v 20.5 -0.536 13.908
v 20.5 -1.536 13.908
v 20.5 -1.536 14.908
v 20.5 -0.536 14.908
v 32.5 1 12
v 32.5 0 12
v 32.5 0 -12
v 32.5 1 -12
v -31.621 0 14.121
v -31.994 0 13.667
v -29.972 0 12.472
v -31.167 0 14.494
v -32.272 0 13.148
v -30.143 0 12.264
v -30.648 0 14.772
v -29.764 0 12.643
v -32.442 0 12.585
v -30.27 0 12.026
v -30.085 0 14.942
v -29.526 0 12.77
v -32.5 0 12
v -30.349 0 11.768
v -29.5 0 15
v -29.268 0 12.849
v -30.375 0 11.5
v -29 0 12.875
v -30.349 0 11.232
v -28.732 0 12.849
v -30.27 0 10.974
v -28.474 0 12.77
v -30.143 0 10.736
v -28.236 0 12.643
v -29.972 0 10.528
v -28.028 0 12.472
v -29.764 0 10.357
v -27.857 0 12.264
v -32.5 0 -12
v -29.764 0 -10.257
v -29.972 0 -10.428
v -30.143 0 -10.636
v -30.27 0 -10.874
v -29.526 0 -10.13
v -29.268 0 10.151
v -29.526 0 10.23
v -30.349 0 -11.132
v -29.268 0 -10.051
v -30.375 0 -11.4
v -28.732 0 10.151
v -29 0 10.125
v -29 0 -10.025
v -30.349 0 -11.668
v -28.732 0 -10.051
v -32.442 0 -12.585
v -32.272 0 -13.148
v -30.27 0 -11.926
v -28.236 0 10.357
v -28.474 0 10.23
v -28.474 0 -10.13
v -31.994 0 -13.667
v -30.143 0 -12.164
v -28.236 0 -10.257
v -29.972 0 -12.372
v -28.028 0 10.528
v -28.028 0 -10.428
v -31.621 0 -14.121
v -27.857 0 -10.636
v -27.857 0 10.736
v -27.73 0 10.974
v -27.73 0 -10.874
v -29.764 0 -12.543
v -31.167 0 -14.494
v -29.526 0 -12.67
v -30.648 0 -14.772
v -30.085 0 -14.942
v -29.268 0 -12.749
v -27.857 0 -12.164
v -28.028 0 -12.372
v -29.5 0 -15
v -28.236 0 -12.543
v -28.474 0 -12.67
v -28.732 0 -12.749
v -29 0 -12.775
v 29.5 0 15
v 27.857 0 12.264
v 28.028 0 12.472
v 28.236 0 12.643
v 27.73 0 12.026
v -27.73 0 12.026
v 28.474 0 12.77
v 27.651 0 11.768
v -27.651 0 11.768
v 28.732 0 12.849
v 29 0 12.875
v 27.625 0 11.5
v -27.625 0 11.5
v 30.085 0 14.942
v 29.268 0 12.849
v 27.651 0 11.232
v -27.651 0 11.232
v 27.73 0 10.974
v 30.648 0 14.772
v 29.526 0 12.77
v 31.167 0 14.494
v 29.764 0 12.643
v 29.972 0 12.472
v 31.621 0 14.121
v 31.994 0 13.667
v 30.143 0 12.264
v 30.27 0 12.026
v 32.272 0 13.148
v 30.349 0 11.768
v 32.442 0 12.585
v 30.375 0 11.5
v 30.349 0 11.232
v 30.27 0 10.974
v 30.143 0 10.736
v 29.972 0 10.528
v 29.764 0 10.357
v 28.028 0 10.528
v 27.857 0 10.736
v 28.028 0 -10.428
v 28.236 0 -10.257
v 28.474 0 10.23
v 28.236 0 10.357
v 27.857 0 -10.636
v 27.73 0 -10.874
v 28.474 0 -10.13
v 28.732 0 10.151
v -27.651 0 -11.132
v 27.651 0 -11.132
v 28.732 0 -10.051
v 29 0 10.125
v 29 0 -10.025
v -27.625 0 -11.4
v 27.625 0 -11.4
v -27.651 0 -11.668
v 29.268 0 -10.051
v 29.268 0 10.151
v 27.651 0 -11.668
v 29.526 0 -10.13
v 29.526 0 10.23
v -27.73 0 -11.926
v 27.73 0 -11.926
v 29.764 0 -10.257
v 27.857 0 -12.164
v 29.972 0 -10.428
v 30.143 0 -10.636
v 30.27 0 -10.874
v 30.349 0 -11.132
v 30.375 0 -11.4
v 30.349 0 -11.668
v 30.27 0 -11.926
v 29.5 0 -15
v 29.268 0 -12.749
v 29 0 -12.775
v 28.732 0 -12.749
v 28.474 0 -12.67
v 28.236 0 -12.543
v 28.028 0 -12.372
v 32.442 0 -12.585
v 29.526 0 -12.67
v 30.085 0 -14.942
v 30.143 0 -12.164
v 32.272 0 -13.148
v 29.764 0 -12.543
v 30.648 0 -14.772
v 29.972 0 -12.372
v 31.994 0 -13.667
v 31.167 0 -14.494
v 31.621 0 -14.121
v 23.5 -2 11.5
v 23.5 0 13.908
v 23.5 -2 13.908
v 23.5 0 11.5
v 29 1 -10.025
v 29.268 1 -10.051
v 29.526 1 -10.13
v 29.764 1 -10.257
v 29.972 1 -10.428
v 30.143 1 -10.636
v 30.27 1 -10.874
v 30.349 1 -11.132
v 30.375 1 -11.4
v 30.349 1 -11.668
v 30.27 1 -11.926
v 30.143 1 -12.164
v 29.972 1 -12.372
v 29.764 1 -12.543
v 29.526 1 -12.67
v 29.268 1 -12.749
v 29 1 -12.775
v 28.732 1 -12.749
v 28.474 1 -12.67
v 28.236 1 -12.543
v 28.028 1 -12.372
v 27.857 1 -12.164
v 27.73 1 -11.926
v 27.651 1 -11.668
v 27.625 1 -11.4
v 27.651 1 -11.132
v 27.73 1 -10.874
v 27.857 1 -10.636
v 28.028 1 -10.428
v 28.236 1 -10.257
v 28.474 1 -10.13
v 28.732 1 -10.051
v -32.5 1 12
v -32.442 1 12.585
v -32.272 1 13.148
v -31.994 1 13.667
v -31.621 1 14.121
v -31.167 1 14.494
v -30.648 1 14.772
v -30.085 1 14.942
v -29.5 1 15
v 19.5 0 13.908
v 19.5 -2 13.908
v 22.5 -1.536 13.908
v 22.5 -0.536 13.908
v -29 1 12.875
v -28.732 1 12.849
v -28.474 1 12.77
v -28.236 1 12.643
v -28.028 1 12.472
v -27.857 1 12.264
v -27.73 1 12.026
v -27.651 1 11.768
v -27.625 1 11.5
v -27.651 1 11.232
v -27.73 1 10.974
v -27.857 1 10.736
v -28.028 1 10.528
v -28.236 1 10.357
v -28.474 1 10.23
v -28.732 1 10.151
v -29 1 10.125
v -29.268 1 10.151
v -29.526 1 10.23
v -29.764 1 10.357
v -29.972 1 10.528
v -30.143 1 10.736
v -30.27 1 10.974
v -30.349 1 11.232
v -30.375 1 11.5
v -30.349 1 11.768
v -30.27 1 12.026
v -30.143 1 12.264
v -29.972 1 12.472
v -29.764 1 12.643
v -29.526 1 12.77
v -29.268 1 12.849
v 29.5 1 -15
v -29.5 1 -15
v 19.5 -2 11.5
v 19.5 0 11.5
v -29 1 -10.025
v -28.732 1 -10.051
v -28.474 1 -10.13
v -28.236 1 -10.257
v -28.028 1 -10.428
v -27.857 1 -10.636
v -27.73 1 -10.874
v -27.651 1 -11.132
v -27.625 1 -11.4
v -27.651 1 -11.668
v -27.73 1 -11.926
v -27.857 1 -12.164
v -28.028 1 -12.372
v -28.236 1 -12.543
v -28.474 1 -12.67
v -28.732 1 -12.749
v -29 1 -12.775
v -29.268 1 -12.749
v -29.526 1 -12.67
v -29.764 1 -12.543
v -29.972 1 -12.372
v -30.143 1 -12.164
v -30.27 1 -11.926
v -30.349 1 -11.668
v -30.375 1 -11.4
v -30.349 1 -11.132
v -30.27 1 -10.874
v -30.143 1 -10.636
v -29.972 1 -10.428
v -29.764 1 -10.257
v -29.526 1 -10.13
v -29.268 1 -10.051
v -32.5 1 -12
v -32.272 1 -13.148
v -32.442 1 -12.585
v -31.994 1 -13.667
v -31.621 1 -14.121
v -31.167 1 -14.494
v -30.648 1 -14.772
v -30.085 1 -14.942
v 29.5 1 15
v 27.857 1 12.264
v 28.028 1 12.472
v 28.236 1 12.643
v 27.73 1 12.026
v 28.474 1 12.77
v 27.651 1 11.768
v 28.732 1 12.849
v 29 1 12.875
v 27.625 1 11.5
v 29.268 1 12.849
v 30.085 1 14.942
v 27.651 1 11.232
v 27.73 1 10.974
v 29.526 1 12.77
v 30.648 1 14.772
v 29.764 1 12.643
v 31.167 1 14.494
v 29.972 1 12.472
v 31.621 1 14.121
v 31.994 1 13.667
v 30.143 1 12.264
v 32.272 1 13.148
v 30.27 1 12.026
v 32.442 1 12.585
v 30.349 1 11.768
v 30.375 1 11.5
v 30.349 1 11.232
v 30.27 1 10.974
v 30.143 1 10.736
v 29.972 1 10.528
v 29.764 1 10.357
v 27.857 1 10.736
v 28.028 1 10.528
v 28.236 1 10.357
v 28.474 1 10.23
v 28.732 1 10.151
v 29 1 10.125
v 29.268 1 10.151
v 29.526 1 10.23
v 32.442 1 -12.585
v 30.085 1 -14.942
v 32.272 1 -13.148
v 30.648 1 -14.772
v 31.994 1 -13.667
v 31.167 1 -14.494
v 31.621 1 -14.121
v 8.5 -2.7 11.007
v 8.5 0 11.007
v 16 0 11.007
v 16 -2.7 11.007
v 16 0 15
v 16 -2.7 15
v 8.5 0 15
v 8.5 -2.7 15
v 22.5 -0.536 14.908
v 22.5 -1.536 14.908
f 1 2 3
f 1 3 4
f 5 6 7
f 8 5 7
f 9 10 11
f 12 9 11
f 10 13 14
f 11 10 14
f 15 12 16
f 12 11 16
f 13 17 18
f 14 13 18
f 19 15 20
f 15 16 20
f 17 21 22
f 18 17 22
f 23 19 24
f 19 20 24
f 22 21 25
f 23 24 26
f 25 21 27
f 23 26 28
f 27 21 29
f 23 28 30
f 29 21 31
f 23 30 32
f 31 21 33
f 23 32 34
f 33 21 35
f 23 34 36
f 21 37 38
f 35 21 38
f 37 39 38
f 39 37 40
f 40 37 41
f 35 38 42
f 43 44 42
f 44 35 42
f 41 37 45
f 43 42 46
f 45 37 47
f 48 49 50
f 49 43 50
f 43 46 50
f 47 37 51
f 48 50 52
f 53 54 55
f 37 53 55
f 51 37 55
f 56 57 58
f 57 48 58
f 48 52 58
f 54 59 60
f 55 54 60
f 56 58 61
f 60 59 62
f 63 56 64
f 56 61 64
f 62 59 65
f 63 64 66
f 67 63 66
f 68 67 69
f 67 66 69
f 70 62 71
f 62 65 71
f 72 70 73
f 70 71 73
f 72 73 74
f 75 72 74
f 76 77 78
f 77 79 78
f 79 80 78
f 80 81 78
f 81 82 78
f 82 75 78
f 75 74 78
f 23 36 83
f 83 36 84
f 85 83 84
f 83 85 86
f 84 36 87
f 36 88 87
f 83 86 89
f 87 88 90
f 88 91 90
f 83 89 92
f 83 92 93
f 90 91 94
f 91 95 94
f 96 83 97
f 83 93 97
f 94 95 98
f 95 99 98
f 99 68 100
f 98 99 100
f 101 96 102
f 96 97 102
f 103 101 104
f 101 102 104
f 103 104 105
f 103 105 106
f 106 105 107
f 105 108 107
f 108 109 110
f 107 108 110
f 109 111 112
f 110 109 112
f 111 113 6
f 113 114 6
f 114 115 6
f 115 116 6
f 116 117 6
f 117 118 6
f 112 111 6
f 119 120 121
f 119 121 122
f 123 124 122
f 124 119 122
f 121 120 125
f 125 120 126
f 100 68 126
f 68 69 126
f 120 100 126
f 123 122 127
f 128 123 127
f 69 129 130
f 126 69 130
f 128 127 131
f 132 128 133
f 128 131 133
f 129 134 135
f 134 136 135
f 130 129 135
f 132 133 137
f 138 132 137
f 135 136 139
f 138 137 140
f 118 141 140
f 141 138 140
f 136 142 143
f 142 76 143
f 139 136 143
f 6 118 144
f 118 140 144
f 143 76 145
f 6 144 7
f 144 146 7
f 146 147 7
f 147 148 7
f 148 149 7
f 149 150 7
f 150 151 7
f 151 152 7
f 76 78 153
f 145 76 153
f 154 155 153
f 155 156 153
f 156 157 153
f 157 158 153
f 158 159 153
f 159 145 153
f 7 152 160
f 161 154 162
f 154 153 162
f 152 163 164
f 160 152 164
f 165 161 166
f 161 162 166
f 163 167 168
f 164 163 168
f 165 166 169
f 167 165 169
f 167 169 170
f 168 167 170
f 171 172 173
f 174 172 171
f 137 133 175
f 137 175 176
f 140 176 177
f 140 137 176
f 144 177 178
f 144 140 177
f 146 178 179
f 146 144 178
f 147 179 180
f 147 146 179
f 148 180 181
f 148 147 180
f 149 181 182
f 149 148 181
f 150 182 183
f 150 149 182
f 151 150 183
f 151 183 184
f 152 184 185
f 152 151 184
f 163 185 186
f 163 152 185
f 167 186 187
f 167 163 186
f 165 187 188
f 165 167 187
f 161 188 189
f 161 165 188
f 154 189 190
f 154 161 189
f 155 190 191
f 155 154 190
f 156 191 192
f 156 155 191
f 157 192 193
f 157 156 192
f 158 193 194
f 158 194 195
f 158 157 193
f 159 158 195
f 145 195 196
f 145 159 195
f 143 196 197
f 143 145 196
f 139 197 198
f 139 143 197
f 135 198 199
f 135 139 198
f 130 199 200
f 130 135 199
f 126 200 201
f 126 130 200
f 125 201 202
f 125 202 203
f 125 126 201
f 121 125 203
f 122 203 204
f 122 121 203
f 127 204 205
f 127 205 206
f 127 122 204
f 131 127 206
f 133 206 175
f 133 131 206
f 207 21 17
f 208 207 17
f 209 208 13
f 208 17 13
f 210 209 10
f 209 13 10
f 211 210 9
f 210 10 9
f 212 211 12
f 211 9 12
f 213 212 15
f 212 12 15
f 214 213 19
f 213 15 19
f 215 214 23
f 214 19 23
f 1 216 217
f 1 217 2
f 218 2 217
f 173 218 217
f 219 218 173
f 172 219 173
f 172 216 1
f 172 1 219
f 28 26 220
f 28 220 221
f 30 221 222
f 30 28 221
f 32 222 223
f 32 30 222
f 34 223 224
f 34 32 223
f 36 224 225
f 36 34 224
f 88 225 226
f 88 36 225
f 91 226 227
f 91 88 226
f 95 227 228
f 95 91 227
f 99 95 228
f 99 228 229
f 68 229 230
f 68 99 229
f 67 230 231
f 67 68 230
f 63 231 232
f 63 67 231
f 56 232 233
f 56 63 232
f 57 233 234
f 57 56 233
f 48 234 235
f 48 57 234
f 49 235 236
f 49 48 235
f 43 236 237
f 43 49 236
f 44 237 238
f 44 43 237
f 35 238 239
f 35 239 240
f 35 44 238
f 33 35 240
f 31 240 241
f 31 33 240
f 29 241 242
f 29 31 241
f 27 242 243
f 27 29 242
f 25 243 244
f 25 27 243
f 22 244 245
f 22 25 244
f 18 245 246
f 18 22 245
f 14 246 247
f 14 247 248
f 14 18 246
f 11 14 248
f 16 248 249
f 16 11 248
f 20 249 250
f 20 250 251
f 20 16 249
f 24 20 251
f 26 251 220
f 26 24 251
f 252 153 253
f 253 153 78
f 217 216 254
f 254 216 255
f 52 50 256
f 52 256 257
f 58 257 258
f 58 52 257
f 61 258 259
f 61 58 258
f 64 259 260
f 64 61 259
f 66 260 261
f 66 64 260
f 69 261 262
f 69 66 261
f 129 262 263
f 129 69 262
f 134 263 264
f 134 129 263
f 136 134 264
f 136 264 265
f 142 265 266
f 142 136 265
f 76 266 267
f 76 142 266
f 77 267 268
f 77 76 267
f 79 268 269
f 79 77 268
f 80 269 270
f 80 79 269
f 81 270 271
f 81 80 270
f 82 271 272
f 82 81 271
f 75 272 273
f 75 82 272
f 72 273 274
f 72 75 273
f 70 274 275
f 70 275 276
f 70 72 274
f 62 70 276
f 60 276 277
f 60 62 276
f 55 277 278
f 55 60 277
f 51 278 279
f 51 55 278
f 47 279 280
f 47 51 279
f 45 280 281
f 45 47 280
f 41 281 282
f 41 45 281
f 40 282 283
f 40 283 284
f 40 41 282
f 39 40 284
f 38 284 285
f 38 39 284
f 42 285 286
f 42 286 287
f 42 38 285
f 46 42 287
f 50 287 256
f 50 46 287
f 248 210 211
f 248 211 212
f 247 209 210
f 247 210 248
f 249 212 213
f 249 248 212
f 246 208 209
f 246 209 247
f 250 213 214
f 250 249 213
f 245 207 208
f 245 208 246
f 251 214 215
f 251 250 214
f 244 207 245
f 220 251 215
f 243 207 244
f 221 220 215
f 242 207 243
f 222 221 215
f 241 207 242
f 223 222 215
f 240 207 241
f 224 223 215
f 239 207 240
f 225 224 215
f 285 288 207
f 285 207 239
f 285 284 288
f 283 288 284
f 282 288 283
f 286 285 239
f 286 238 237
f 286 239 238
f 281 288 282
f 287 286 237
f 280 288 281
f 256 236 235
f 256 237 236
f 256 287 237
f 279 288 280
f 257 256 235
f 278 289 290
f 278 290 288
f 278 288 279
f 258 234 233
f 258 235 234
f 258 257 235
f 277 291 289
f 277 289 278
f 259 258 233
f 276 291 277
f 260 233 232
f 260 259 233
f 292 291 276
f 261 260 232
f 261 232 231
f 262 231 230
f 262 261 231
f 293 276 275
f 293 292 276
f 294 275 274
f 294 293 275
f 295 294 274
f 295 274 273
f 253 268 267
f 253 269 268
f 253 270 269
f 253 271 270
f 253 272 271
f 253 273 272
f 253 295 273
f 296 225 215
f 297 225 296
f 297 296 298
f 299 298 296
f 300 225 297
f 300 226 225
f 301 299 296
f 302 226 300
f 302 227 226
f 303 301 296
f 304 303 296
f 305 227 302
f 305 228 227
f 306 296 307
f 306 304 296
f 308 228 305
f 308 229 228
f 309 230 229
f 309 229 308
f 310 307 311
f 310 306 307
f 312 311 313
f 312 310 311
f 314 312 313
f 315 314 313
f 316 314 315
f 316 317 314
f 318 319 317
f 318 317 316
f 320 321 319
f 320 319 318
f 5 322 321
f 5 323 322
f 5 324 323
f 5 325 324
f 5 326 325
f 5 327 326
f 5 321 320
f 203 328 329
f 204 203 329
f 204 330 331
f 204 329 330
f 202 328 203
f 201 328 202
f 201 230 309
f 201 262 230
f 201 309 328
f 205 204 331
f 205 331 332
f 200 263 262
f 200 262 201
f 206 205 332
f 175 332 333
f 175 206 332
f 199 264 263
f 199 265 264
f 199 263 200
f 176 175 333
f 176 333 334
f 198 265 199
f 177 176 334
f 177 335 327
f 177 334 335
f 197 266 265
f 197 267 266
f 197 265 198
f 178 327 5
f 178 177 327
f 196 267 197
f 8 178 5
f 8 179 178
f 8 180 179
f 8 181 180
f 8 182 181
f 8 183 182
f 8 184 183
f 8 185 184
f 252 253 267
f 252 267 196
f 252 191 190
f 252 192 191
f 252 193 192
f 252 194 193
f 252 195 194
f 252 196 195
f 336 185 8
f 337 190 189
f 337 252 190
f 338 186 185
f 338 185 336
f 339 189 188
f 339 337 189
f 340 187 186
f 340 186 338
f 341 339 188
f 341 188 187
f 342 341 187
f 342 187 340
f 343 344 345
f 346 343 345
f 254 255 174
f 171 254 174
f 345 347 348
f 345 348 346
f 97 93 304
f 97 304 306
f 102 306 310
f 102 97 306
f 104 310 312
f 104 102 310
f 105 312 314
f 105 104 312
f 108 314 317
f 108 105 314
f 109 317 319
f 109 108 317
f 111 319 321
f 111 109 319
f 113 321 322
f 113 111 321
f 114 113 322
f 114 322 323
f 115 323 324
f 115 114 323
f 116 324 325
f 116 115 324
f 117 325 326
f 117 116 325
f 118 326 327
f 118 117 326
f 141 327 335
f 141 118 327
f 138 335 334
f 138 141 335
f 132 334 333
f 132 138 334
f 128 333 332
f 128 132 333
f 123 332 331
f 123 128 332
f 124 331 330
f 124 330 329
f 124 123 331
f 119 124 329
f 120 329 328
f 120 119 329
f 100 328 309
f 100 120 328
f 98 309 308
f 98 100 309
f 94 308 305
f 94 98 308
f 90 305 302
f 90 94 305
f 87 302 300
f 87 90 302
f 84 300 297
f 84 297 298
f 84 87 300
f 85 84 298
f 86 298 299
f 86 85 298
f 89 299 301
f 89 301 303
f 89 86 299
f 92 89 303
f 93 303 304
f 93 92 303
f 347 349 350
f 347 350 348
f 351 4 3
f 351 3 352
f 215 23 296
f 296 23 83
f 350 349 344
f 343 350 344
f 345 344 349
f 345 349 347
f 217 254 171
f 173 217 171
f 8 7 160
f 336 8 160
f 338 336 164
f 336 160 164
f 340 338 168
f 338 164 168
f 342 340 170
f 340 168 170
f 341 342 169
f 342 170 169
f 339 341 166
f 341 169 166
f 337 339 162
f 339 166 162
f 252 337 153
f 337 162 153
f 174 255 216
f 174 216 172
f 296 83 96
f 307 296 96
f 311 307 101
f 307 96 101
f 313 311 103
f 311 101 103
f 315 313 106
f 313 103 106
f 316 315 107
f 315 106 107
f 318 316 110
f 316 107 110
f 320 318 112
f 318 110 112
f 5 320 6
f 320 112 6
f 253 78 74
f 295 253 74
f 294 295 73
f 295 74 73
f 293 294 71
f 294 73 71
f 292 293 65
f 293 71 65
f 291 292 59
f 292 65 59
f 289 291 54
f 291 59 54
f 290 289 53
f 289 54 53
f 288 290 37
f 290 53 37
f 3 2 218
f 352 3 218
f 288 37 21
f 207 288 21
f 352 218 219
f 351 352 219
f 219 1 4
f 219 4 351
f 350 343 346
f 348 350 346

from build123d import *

# Parameters (mm, degrees)
SKETCH_1_R      = 1.375
EXTRUDE_2_DEPTH = 1
SKETCH_3_W      = 7.5
SKETCH_3_H      = 3.992889191
EXTRUDE_3_DEPTH = 2.7
SKETCH_4_W      = 4
SKETCH_4_H      = 2.408214145
EXTRUDE_4_DEPTH = 2
SKETCH_5_W      = 2
SKETCH_5_H      = 1
EXTRUDE_5_DEPTH = 1


with BuildPart() as part:
    # 草图1 → 凸台-拉伸2 (new body)
    with BuildSketch(Plane(origin=(0, 0, 0), x_dir=(1, 0, 0), z_dir=(0, 1, 0))):
        with BuildLine():
            Line((-32.5, 12), (-32.5, -12))
            ThreePointArc((-32.5, -12), (-31.621320344, -14.121320344), (-29.5, -15))
            Line((-29.5, -15), (29.5, -15))
            ThreePointArc((29.5, -15), (31.621320344, -14.121320344), (32.5, -12))
            Line((32.5, -12), (32.5, 12))
            ThreePointArc((32.5, 12), (31.621320344, 14.121320344), (29.5, 15))
            Line((29.5, 15), (-29.5, 15))
            ThreePointArc((-29.5, 15), (-31.621320344, 14.121320344), (-32.5, 12))
        make_face()
        with Locations(Location((29, 11.4, 0), (0, 0, 270))):
            Circle(SKETCH_1_R, mode=Mode.SUBTRACT)
        with Locations(Location((29, -11.5, 0), (0, 0, 270))):
            Circle(SKETCH_1_R, mode=Mode.SUBTRACT)
        with Locations(Location((-29, -11.5, 0), (0, 0, 270))):
            Circle(SKETCH_1_R, mode=Mode.SUBTRACT)
        with Locations(Location((-29, 11.4, 0), (0, 0, 270))):
            Circle(SKETCH_1_R, mode=Mode.SUBTRACT)
    extrude(amount=EXTRUDE_2_DEPTH)


with BuildPart() as body_2:
    # 草图3 → 凸台-拉伸3 (new body)
    with BuildSketch(Plane(origin=(0, 0, 0), x_dir=(1, 0, 0), z_dir=(0, 1, 0))):
        with Locations((12.25, -13.003555405)):
            Rectangle(SKETCH_3_W, SKETCH_3_H)
    extrude(amount=-EXTRUDE_3_DEPTH)


with BuildPart() as body_3:
    # 草图4 → 凸台-拉伸4 (new body)
    with BuildSketch(Plane(origin=(0, 0, 0), x_dir=(1, 0, 0), z_dir=(0, 1, 0))):
        with Locations((21.5, -12.704107073)):
            Rectangle(SKETCH_4_W, SKETCH_4_H)
    extrude(amount=-EXTRUDE_4_DEPTH)

    # 草图5 → 凸台-拉伸5 (add)
    with BuildSketch(Plane.XY.offset(13.908214145)):
        with Locations((21.5, -1.035773925)):
            Rectangle(SKETCH_5_W, SKETCH_5_H)
    extrude(amount=EXTRUDE_5_DEPTH)


solid = Compound([part.part, body_2.part, body_3.part])
